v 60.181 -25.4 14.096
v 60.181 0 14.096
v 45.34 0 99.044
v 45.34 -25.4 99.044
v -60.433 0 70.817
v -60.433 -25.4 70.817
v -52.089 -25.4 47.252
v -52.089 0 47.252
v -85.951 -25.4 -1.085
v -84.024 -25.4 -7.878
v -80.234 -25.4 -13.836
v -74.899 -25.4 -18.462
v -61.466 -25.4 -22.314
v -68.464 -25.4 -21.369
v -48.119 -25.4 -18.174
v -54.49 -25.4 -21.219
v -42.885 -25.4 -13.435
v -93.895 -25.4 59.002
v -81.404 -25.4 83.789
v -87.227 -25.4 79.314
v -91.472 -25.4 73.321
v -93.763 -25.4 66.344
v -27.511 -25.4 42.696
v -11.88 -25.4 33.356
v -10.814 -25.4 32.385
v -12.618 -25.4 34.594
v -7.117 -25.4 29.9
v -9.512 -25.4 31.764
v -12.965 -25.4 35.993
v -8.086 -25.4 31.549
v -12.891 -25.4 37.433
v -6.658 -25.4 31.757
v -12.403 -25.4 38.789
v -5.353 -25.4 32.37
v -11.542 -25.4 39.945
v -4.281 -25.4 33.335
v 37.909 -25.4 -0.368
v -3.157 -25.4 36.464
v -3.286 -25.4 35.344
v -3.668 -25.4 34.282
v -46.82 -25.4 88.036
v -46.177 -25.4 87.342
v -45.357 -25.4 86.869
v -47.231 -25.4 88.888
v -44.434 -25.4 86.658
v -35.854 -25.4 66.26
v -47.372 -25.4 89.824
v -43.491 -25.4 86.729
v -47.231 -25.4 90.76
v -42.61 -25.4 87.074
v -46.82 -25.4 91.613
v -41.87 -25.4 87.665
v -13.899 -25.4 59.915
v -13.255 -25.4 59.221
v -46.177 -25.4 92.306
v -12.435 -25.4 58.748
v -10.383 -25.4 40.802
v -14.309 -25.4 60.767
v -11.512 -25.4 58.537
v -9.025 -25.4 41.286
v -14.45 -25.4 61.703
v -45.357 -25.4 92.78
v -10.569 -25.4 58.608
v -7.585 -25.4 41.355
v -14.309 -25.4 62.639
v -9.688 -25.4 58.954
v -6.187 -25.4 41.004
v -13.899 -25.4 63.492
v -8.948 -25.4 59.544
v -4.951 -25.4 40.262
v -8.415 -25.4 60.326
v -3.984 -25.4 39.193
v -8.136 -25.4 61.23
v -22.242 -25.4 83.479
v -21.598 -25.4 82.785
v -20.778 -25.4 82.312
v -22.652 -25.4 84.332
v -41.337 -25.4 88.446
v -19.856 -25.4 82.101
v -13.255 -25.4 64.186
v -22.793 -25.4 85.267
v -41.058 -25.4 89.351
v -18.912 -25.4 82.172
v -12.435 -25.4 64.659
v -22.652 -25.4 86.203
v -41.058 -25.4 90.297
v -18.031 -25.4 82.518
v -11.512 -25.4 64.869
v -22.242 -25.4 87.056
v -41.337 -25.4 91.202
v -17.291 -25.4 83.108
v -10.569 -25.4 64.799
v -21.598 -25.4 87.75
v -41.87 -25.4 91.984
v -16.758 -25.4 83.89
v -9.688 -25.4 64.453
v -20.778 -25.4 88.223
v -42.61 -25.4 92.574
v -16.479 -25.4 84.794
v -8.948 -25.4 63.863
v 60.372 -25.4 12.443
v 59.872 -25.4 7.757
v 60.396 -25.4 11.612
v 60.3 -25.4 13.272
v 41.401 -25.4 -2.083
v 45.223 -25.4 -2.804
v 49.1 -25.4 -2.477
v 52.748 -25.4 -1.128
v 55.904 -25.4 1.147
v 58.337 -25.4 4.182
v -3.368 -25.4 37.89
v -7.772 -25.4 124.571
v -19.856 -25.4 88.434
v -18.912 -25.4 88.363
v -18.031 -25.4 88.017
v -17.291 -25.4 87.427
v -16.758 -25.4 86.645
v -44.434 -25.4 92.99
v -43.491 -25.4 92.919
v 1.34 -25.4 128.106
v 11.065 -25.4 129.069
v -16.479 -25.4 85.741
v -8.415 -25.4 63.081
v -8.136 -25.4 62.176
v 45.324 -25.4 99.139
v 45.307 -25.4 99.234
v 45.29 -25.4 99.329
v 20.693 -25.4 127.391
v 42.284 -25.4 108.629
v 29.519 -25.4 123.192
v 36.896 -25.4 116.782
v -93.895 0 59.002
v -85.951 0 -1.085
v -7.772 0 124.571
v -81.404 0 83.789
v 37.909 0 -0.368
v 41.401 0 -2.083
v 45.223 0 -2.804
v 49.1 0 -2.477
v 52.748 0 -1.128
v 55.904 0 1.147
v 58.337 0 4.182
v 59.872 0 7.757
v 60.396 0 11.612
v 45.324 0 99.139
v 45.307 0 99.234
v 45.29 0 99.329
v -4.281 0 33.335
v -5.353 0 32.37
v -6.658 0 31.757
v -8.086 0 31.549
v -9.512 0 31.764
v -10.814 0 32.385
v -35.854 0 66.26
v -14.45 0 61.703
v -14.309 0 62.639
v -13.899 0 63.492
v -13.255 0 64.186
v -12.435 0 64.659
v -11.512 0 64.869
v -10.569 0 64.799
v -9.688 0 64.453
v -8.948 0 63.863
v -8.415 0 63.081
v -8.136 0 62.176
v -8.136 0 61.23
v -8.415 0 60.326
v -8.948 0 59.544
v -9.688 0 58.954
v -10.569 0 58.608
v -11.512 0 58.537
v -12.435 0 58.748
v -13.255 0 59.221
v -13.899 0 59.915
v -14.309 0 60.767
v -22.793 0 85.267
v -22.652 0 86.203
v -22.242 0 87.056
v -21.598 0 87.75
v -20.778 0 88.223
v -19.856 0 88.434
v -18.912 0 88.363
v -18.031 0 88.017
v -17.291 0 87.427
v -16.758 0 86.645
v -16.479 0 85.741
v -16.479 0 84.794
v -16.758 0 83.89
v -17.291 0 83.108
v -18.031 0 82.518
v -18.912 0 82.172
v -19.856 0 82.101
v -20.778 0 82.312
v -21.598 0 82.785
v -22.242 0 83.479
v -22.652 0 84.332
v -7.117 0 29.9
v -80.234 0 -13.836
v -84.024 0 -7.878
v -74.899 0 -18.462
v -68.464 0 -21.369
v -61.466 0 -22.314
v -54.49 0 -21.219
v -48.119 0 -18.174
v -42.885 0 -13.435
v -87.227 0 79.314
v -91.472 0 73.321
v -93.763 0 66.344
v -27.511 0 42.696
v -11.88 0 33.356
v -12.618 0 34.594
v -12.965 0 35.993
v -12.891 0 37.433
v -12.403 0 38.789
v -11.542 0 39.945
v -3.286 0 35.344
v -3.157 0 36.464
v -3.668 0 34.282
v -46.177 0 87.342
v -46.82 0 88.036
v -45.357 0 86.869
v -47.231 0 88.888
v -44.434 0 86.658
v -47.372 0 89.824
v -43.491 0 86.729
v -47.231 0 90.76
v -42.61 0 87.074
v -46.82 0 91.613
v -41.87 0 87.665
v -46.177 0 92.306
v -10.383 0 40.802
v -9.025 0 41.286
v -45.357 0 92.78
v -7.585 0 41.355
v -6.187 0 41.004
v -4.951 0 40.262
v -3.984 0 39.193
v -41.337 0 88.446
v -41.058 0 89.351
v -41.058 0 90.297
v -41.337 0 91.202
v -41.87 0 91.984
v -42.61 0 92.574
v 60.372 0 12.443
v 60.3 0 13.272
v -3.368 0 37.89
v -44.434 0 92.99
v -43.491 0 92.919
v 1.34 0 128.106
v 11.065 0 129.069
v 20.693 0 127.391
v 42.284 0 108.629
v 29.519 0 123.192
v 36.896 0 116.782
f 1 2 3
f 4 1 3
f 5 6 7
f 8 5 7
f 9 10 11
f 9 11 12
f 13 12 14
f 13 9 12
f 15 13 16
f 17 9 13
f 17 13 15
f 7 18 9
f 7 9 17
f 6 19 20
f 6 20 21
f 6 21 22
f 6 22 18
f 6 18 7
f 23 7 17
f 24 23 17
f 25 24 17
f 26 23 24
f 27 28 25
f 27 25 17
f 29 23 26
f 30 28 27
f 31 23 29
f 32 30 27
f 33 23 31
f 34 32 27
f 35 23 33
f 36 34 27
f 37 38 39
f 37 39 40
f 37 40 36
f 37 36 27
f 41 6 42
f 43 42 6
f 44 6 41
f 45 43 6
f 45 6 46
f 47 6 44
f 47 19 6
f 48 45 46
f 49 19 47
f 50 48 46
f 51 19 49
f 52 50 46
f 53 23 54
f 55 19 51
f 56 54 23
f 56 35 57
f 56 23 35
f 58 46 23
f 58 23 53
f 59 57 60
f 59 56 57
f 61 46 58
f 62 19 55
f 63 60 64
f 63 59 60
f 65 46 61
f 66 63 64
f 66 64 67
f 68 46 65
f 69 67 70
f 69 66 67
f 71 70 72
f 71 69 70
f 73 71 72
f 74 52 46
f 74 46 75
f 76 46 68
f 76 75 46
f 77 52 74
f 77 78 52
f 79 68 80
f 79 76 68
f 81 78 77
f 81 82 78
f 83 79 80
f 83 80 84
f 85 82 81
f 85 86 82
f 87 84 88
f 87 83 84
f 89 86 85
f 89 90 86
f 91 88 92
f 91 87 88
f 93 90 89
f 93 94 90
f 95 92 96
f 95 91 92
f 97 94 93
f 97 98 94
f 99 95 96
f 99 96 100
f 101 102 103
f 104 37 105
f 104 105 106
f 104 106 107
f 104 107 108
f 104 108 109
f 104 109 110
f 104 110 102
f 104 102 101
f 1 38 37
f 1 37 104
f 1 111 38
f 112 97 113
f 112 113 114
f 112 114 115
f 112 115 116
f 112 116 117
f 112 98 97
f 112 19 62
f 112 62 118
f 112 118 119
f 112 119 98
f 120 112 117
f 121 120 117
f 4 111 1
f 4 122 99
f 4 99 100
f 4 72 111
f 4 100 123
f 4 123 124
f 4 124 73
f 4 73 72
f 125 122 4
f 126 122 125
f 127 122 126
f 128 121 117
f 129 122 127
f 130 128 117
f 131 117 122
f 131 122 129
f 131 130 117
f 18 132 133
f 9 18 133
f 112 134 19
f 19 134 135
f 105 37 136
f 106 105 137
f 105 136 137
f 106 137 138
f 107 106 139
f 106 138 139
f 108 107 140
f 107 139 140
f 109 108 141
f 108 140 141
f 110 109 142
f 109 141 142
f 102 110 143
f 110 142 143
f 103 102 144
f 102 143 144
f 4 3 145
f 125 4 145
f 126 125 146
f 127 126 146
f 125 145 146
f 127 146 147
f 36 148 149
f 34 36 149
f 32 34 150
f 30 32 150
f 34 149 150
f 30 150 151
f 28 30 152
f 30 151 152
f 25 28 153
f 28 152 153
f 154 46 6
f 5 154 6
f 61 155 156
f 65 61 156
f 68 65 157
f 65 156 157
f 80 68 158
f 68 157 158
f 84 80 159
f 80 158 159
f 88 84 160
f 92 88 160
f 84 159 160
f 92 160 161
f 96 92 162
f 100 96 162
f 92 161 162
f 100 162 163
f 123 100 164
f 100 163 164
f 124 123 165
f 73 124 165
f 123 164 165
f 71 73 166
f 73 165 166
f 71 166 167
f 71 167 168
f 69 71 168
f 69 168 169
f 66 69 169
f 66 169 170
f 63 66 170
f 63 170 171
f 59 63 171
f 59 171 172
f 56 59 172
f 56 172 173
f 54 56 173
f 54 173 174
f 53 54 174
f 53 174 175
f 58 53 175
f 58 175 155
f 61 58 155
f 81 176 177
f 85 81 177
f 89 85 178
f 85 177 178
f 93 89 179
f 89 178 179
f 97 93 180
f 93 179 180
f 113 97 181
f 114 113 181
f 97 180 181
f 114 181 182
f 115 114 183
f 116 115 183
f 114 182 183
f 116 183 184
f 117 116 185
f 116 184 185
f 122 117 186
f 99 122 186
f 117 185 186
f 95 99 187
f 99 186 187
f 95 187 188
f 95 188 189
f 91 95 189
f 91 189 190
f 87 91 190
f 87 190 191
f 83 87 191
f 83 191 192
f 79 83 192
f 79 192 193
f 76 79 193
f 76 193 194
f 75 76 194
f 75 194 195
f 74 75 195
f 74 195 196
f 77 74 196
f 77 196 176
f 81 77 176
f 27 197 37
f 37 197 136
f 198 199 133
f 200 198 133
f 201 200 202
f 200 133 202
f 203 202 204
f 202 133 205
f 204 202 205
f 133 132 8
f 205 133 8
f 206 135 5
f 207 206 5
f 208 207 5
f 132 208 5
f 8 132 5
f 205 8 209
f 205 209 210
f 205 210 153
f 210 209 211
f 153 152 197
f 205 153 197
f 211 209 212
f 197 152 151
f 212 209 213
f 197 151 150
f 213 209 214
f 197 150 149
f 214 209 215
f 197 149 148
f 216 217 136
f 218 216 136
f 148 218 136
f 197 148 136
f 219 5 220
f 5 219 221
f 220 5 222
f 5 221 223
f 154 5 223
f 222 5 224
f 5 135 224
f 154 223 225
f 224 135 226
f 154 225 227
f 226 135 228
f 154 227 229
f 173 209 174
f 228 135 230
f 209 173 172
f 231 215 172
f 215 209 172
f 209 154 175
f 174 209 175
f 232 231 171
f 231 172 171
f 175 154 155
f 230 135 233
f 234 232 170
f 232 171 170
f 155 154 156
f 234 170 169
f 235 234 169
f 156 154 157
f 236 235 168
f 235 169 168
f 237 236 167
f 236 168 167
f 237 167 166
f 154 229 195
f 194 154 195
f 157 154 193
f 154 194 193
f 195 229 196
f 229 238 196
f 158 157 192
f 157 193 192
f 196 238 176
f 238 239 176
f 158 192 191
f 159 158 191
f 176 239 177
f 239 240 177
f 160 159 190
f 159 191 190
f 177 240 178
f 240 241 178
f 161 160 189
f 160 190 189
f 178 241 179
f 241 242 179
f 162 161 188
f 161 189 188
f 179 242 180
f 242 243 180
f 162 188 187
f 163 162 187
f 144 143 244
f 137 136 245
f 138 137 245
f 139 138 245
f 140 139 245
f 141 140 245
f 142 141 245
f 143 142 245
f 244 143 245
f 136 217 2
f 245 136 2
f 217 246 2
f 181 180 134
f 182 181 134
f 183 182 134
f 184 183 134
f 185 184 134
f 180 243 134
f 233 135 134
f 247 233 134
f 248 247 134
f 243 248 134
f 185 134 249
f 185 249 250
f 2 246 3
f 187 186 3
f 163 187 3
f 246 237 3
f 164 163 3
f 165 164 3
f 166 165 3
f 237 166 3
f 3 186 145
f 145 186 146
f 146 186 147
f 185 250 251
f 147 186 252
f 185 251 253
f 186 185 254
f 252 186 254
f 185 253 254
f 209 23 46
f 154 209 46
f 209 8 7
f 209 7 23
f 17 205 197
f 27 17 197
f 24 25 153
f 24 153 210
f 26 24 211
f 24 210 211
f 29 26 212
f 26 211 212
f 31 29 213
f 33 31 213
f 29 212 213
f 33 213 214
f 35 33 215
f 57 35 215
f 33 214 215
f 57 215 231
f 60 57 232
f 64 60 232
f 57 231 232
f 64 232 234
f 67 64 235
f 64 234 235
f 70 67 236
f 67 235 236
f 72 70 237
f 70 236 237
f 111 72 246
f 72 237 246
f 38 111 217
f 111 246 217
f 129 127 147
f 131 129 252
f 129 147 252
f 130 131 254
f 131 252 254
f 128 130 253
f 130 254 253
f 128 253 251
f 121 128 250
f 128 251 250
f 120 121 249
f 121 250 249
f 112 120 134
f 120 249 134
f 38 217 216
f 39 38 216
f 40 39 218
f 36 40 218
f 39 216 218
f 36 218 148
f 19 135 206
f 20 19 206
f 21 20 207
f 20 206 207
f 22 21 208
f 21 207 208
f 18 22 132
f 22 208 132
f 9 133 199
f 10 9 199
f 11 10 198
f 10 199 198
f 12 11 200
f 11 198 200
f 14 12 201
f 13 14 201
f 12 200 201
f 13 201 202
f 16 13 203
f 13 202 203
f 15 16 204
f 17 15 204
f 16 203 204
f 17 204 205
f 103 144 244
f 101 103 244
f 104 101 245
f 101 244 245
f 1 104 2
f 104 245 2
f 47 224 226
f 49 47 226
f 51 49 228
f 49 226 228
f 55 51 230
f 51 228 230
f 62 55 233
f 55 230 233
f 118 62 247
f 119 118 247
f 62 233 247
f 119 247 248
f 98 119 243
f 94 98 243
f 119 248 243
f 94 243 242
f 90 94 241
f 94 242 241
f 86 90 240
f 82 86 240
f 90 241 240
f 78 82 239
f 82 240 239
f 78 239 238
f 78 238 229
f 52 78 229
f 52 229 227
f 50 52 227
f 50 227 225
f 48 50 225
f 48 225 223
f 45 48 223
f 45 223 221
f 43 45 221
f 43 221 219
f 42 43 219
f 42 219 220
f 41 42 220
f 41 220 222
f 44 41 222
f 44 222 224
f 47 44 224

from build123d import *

# Parameters (mm, degrees)
F1_DEPTH = 25.4
F3_DEPTH = 25.4
F4_DEPTH = 25.4
F5_D     = 6.35
F6_D     = 6.35
F7_D     = 6.35


with BuildPart() as f1:
    # F0 (on Front) → F1 (new body)
    with BuildSketch(Plane.XZ):
        with BuildLine():
            ThreePointArc((-81.4044819336, 83.7894535693), (-56.9535815274, 83.462929282), (-44.8214243022, 62.2317279536))
            ThreePointArc((-44.8214243022, 62.2317279536), (-67.8461689377, 37.641623994), (-93.8954395614, 59.0015766684))
            Line((-93.8954395614, 59.0015766684), (-85.9510365488, -1.0845648523))
            ThreePointArc((-85.9510365488, -1.0845648523), (-63.3331540861, 26.4987987528), (-37.294890351, 2.1180814432))
            ThreePointArc((-37.294890351, 2.1180814432), (-38.734729228, -6.1455375994), (-42.8845494933, -13.4352239739))
            Line((-42.8845494933, -13.4352239739), (-7.1169419868, 29.8995050449))
            Line((-7.1169419868, 29.8995050449), (37.9090425379, -0.3676435997))
            ThreePointArc((37.9090425379, -0.3676435997), (38.1002397013, 23.7171988773), (60.1805807204, 14.0956223965))
            Line((60.1805807205, 14.0956223965), (45.3402720787, 99.0440562508))
            ThreePointArc((45.3402720787, 99.0440562508), (45.7257653294, 96.0179672104), (45.8545692558, 92.9701434826))
            ThreePointArc((45.8545692558, 92.9701434826), (-8.6091784666, 61.8478937228), (-7.7715557558, 124.5710364556))
            Line((-7.7715557558, 124.5710364556), (-81.4044819336, 83.7894535693))
        make_face()
        with BuildLine():
            Line((-4.2810993854, 33.3353085342), (-7.1169419868, 29.8995050449))
            Line((-7.1169419868, 29.8995050449), (-10.8142049734, 32.3848612137))
            ThreePointArc((-10.8142049734, 32.3848612137), (-10.3830468788, 40.8024385377), (-3.1566041276, 36.4642326329))
            ThreePointArc((-3.1566041276, 36.4642326329), (-3.4462625741, 34.8018055217), (-4.2810993854, 33.3353085342))
        make_face(mode=Mode.SUBTRACT)
        with BuildLine():
            ThreePointArc((45.2904246952, 99.3293910955), (25.2484905686, 125.5912487777), (-7.7715557558, 124.5710364556))
            ThreePointArc((-7.7715557558, 124.5710364556), (-8.6091784666, 61.8478937228), (45.8545692558, 92.9701434826))
            ThreePointArc((45.8545692558, 92.9701434826), (45.7257653294, 96.0179672104), (45.3402720787, 99.0440562508))
            Line((45.3402720787, 99.0440562508), (45.2904246952, 99.3293910955))
        make_face()
        with BuildLine():
            ThreePointArc((-93.8954395614, 59.0015766684), (-67.8461689377, 37.641623994), (-44.8214243022, 62.2317279536))
            ThreePointArc((-44.8214243022, 62.2317279536), (-56.9535815274, 83.462929282), (-81.4044819336, 83.7894535693))
            ThreePointArc((-81.4044819336, 83.7894535693), (-91.4718288588, 73.321407878), (-93.8954395614, 59.0015766684))
        make_face()
        with BuildLine():
            ThreePointArc((-37.294890351, 2.1180814432), (-63.3331540861, 26.4987987528), (-85.9510365488, -1.0845648523))
            ThreePointArc((-85.9510365488, -1.0845648523), (-68.4639217442, -21.3686596672), (-42.8845494933, -13.4352239739))
            ThreePointArc((-42.8845494933, -13.4352239739), (-38.734729228, -6.1455375994), (-37.294890351, 2.1180814432))
        make_face()
        with BuildLine():
            ThreePointArc((60.3959257616, 11.6116108139), (60.3419887269, 12.858275066), (60.1805807204, 14.0956223965))
            ThreePointArc((60.1805807204, 14.0956223965), (38.1002397013, 23.7171988773), (37.9090425379, -0.3676435997))
            ThreePointArc((37.9090425379, -0.3676435997), (52.7482001902, -1.1277225028), (60.3959257616, 11.6116108139))
        make_face()
        with BuildLine():
            Line((-10.8142049734, 32.3848612137), (-7.1169419868, 29.8995050449))
            Line((-7.1169419868, 29.8995050449), (-4.2810993854, 33.3353085342))
            ThreePointArc((-4.2810993854, 33.3353085342), (-7.3643405271, 31.6000525145), (-10.8142049734, 32.3848612137))
        make_face()
        with BuildLine():
            ThreePointArc((45.3402720787, 99.0440562508), (45.315634379, 99.1867736354), (45.2904246952, 99.3293910955))
            Line((45.2904246952, 99.3293910955), (45.3402720787, 99.0440562508))
        make_face()
    extrude(amount=F1_DEPTH)

    # F2 (on face) → F3 (cut)
    with BuildSketch(Plane.XZ.offset(25.4)):
        Polygon((-52.0894788206, 47.2524687648), (-35.853933543, 66.2599354982), (-60.4326552345, 70.8165967862), align=None)
    extrude(amount=-F3_DEPTH, mode=Mode.SUBTRACT)

    # F2 (on face) → F4 (cut)
    with BuildSketch(Plane.XZ.offset(25.4)):
        Polygon((-27.510757129, 42.6958074768), (-35.853933543, 66.2599354982), (-52.0894788206, 47.2524687648), align=None)
    extrude(amount=-F4_DEPTH, mode=Mode.SUBTRACT)

    # F5 (through all)
    with Locations(Plane.XZ.offset(25.4)):
        with Locations((-19.6183882654, 85.2674022317)):
            Hole(F5_D / 2)

    # F6 (through all)
    with Locations(Plane.XZ.offset(25.4)):
        with Locations((-44.1971099569, 89.8240635197)):
            Hole(F6_D / 2)

    # F7 (through all)
    with Locations(Plane.XZ.offset(25.4)):
        with Locations((-11.2752118514, 61.7032742103)):
            Hole(F7_D / 2)


solid = f1.part
